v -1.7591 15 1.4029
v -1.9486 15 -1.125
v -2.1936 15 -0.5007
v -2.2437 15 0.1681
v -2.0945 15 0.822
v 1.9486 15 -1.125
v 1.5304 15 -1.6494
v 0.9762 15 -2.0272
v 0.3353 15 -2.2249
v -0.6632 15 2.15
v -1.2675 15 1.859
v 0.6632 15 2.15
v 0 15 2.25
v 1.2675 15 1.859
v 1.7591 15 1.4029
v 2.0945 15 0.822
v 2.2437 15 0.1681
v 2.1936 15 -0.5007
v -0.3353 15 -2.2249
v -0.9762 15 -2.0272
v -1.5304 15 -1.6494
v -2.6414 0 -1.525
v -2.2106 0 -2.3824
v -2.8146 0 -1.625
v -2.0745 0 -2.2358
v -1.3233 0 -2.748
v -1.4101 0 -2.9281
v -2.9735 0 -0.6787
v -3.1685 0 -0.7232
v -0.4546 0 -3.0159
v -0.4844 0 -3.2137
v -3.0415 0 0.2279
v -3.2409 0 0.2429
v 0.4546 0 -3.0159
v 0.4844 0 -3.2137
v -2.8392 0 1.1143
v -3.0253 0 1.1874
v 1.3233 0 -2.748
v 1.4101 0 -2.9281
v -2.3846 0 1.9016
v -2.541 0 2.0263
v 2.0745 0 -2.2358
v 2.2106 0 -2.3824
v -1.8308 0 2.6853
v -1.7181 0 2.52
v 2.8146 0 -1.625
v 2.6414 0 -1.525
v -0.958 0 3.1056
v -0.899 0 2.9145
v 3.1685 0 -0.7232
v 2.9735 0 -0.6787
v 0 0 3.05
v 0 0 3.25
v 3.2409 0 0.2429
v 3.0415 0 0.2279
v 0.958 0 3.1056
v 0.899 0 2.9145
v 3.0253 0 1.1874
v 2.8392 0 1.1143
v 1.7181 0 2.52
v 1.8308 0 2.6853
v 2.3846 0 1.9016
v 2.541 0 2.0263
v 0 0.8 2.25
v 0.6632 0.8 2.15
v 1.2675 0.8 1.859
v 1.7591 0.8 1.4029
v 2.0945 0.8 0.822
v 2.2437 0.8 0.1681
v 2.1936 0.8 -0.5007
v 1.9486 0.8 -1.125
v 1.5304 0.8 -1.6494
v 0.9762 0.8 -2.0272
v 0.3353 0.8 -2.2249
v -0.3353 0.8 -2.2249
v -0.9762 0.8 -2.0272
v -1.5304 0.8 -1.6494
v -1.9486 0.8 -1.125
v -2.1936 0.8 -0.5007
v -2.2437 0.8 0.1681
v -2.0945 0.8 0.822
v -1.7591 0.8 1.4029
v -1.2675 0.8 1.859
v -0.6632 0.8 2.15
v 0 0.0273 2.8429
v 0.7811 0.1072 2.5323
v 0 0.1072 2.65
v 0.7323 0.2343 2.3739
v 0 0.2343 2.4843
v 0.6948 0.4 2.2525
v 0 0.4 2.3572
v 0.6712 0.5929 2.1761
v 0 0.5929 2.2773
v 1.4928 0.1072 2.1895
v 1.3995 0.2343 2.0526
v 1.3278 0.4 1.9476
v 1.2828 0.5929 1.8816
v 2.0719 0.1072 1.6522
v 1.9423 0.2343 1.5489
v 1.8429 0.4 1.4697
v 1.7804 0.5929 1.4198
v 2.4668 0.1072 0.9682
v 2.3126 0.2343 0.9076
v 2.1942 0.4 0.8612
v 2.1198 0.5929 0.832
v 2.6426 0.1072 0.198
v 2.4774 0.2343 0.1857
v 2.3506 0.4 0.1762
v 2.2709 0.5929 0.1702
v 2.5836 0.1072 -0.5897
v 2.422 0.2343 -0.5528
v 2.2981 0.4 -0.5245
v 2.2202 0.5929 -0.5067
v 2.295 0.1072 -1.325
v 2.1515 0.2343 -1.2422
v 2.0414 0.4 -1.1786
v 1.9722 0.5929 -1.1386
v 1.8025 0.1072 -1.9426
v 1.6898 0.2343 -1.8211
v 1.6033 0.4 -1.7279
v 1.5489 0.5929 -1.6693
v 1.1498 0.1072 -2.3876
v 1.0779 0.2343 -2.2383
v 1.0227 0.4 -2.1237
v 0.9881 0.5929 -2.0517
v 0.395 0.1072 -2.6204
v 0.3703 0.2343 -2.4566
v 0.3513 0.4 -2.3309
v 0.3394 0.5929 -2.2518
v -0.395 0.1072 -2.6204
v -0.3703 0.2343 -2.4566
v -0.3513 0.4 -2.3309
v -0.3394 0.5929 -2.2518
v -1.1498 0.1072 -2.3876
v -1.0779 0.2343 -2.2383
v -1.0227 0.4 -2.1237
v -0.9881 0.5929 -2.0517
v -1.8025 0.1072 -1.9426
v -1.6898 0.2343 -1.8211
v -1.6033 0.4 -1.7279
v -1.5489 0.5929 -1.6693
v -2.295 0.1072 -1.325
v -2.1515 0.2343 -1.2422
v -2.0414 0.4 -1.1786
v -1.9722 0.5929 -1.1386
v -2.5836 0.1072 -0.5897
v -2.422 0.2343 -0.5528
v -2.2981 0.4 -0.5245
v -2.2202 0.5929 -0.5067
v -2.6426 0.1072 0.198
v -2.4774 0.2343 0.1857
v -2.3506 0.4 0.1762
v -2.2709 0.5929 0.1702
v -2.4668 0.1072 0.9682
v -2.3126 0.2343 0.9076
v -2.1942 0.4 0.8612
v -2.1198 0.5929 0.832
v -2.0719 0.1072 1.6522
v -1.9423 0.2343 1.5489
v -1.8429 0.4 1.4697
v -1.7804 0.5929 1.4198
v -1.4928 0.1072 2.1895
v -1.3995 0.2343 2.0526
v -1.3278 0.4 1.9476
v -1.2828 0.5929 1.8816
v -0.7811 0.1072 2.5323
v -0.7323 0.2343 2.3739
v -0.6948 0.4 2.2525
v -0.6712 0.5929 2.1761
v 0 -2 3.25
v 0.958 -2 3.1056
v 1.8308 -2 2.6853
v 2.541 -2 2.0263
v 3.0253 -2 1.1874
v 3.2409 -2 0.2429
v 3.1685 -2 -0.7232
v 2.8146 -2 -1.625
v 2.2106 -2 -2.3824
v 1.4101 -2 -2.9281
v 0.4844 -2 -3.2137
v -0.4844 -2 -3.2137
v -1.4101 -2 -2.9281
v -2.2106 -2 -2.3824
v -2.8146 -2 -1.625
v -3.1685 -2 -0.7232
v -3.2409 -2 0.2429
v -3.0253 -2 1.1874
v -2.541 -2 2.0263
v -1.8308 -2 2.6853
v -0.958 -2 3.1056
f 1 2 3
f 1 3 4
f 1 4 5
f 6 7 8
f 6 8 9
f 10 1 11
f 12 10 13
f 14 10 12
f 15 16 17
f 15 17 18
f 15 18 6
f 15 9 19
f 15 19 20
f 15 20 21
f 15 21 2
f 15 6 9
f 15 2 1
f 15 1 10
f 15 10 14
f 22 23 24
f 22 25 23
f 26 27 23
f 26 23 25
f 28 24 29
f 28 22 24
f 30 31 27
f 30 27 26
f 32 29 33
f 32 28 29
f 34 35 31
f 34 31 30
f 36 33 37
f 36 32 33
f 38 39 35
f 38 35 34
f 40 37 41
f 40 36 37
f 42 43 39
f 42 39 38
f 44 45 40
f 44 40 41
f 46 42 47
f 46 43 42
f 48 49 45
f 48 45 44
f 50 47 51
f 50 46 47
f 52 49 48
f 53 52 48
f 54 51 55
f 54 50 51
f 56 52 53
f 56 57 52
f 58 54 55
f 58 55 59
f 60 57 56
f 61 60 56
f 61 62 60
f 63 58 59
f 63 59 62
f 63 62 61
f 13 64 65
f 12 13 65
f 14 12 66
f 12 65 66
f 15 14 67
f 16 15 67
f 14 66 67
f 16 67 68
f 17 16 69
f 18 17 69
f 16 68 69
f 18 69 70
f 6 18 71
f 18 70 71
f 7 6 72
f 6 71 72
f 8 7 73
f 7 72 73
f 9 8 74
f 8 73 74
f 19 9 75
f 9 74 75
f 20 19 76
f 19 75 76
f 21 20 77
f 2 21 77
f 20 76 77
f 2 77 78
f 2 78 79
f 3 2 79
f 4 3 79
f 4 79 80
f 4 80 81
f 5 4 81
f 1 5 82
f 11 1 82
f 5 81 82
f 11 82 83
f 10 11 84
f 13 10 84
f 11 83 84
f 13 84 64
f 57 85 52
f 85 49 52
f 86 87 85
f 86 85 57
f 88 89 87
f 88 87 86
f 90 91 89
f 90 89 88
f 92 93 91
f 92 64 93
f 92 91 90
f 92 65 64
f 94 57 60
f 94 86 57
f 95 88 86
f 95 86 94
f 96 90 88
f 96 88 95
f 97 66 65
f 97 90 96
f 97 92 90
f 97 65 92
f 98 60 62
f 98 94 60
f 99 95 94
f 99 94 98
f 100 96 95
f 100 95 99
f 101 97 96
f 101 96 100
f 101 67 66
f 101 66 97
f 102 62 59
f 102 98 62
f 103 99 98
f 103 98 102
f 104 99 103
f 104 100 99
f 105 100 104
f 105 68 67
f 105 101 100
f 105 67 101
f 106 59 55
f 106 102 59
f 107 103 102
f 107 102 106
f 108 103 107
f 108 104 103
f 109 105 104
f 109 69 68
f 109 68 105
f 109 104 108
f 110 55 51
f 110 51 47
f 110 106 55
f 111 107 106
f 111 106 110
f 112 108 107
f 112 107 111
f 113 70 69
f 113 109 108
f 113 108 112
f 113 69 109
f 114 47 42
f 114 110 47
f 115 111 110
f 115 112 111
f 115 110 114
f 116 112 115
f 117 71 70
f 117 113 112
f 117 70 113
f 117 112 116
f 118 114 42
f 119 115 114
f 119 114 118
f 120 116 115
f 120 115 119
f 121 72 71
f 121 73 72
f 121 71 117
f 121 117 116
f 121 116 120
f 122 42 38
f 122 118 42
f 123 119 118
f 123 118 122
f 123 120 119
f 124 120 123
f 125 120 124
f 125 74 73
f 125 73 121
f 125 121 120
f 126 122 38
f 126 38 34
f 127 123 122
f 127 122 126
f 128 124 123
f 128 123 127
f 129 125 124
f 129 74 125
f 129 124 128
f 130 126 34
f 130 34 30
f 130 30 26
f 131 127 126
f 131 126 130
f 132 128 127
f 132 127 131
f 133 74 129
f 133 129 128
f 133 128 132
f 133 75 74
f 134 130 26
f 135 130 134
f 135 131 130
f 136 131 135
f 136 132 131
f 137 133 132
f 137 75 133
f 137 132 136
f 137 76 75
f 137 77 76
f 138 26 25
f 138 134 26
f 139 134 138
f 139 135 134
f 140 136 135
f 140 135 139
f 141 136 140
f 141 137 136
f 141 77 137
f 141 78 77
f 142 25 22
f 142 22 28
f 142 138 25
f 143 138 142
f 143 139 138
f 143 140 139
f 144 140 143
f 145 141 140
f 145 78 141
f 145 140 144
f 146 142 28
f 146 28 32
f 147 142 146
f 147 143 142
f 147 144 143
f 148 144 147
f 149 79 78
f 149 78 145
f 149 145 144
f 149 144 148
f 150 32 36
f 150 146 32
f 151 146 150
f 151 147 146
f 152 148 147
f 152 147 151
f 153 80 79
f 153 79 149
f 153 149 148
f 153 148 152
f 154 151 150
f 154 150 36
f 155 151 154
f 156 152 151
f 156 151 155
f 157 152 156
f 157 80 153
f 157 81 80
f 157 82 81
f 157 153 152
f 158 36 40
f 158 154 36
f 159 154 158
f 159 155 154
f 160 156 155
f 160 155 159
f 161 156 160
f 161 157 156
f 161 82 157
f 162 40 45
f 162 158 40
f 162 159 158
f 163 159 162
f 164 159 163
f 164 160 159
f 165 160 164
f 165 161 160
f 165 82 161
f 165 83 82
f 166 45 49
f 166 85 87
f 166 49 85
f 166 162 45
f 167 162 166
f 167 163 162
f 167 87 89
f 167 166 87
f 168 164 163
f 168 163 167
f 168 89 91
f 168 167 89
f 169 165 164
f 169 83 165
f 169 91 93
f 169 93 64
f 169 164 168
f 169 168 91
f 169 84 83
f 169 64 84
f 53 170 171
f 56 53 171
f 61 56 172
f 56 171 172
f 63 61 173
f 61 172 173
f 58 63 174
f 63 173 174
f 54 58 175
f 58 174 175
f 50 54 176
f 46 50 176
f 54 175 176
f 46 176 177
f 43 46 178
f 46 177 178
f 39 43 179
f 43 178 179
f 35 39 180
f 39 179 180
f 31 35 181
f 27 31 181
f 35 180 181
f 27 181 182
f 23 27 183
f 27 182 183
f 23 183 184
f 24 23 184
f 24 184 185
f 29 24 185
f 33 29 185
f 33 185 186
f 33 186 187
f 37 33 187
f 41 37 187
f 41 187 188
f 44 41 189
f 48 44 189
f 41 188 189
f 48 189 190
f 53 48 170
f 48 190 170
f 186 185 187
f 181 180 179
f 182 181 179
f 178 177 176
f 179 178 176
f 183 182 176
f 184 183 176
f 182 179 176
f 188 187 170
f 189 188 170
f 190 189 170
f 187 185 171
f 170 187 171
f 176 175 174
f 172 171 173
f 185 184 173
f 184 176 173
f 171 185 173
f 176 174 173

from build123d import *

# Parameters (mm, degrees)
SKETCH2_R           = 2.25
BOSS_EXTRUDE1_DEPTH = 15
SKETCH2_3_R         = 3.25
BOSS_EXTRUDE2_DEPTH = 2
FILLET1_R           = 0.8


with BuildPart() as part:
    # Sketch2 → Boss-Extrude1 (new body)
    with BuildSketch(Plane(origin=(0, 0, 0), x_dir=(1, 0, 0), z_dir=(0, 1, 0))):
        Circle(SKETCH2_R)
    extrude(amount=BOSS_EXTRUDE1_DEPTH)

    # Sketch2<3> → Boss-Extrude2 (add)
    with BuildSketch(Plane(origin=(0, 0, 0), x_dir=(1, 0, 0), z_dir=(0, 1, 0))):
        Circle(SKETCH2_3_R)
    extrude(amount=-BOSS_EXTRUDE2_DEPTH)

    # Fillet1
    fillet1_edges = [part.edges().sort_by_distance(p)[0] for p in [
        (-2.25, 0, 0),
    ]]
    fillet(fillet1_edges, radius=FILLET1_R)


solid = part.part
